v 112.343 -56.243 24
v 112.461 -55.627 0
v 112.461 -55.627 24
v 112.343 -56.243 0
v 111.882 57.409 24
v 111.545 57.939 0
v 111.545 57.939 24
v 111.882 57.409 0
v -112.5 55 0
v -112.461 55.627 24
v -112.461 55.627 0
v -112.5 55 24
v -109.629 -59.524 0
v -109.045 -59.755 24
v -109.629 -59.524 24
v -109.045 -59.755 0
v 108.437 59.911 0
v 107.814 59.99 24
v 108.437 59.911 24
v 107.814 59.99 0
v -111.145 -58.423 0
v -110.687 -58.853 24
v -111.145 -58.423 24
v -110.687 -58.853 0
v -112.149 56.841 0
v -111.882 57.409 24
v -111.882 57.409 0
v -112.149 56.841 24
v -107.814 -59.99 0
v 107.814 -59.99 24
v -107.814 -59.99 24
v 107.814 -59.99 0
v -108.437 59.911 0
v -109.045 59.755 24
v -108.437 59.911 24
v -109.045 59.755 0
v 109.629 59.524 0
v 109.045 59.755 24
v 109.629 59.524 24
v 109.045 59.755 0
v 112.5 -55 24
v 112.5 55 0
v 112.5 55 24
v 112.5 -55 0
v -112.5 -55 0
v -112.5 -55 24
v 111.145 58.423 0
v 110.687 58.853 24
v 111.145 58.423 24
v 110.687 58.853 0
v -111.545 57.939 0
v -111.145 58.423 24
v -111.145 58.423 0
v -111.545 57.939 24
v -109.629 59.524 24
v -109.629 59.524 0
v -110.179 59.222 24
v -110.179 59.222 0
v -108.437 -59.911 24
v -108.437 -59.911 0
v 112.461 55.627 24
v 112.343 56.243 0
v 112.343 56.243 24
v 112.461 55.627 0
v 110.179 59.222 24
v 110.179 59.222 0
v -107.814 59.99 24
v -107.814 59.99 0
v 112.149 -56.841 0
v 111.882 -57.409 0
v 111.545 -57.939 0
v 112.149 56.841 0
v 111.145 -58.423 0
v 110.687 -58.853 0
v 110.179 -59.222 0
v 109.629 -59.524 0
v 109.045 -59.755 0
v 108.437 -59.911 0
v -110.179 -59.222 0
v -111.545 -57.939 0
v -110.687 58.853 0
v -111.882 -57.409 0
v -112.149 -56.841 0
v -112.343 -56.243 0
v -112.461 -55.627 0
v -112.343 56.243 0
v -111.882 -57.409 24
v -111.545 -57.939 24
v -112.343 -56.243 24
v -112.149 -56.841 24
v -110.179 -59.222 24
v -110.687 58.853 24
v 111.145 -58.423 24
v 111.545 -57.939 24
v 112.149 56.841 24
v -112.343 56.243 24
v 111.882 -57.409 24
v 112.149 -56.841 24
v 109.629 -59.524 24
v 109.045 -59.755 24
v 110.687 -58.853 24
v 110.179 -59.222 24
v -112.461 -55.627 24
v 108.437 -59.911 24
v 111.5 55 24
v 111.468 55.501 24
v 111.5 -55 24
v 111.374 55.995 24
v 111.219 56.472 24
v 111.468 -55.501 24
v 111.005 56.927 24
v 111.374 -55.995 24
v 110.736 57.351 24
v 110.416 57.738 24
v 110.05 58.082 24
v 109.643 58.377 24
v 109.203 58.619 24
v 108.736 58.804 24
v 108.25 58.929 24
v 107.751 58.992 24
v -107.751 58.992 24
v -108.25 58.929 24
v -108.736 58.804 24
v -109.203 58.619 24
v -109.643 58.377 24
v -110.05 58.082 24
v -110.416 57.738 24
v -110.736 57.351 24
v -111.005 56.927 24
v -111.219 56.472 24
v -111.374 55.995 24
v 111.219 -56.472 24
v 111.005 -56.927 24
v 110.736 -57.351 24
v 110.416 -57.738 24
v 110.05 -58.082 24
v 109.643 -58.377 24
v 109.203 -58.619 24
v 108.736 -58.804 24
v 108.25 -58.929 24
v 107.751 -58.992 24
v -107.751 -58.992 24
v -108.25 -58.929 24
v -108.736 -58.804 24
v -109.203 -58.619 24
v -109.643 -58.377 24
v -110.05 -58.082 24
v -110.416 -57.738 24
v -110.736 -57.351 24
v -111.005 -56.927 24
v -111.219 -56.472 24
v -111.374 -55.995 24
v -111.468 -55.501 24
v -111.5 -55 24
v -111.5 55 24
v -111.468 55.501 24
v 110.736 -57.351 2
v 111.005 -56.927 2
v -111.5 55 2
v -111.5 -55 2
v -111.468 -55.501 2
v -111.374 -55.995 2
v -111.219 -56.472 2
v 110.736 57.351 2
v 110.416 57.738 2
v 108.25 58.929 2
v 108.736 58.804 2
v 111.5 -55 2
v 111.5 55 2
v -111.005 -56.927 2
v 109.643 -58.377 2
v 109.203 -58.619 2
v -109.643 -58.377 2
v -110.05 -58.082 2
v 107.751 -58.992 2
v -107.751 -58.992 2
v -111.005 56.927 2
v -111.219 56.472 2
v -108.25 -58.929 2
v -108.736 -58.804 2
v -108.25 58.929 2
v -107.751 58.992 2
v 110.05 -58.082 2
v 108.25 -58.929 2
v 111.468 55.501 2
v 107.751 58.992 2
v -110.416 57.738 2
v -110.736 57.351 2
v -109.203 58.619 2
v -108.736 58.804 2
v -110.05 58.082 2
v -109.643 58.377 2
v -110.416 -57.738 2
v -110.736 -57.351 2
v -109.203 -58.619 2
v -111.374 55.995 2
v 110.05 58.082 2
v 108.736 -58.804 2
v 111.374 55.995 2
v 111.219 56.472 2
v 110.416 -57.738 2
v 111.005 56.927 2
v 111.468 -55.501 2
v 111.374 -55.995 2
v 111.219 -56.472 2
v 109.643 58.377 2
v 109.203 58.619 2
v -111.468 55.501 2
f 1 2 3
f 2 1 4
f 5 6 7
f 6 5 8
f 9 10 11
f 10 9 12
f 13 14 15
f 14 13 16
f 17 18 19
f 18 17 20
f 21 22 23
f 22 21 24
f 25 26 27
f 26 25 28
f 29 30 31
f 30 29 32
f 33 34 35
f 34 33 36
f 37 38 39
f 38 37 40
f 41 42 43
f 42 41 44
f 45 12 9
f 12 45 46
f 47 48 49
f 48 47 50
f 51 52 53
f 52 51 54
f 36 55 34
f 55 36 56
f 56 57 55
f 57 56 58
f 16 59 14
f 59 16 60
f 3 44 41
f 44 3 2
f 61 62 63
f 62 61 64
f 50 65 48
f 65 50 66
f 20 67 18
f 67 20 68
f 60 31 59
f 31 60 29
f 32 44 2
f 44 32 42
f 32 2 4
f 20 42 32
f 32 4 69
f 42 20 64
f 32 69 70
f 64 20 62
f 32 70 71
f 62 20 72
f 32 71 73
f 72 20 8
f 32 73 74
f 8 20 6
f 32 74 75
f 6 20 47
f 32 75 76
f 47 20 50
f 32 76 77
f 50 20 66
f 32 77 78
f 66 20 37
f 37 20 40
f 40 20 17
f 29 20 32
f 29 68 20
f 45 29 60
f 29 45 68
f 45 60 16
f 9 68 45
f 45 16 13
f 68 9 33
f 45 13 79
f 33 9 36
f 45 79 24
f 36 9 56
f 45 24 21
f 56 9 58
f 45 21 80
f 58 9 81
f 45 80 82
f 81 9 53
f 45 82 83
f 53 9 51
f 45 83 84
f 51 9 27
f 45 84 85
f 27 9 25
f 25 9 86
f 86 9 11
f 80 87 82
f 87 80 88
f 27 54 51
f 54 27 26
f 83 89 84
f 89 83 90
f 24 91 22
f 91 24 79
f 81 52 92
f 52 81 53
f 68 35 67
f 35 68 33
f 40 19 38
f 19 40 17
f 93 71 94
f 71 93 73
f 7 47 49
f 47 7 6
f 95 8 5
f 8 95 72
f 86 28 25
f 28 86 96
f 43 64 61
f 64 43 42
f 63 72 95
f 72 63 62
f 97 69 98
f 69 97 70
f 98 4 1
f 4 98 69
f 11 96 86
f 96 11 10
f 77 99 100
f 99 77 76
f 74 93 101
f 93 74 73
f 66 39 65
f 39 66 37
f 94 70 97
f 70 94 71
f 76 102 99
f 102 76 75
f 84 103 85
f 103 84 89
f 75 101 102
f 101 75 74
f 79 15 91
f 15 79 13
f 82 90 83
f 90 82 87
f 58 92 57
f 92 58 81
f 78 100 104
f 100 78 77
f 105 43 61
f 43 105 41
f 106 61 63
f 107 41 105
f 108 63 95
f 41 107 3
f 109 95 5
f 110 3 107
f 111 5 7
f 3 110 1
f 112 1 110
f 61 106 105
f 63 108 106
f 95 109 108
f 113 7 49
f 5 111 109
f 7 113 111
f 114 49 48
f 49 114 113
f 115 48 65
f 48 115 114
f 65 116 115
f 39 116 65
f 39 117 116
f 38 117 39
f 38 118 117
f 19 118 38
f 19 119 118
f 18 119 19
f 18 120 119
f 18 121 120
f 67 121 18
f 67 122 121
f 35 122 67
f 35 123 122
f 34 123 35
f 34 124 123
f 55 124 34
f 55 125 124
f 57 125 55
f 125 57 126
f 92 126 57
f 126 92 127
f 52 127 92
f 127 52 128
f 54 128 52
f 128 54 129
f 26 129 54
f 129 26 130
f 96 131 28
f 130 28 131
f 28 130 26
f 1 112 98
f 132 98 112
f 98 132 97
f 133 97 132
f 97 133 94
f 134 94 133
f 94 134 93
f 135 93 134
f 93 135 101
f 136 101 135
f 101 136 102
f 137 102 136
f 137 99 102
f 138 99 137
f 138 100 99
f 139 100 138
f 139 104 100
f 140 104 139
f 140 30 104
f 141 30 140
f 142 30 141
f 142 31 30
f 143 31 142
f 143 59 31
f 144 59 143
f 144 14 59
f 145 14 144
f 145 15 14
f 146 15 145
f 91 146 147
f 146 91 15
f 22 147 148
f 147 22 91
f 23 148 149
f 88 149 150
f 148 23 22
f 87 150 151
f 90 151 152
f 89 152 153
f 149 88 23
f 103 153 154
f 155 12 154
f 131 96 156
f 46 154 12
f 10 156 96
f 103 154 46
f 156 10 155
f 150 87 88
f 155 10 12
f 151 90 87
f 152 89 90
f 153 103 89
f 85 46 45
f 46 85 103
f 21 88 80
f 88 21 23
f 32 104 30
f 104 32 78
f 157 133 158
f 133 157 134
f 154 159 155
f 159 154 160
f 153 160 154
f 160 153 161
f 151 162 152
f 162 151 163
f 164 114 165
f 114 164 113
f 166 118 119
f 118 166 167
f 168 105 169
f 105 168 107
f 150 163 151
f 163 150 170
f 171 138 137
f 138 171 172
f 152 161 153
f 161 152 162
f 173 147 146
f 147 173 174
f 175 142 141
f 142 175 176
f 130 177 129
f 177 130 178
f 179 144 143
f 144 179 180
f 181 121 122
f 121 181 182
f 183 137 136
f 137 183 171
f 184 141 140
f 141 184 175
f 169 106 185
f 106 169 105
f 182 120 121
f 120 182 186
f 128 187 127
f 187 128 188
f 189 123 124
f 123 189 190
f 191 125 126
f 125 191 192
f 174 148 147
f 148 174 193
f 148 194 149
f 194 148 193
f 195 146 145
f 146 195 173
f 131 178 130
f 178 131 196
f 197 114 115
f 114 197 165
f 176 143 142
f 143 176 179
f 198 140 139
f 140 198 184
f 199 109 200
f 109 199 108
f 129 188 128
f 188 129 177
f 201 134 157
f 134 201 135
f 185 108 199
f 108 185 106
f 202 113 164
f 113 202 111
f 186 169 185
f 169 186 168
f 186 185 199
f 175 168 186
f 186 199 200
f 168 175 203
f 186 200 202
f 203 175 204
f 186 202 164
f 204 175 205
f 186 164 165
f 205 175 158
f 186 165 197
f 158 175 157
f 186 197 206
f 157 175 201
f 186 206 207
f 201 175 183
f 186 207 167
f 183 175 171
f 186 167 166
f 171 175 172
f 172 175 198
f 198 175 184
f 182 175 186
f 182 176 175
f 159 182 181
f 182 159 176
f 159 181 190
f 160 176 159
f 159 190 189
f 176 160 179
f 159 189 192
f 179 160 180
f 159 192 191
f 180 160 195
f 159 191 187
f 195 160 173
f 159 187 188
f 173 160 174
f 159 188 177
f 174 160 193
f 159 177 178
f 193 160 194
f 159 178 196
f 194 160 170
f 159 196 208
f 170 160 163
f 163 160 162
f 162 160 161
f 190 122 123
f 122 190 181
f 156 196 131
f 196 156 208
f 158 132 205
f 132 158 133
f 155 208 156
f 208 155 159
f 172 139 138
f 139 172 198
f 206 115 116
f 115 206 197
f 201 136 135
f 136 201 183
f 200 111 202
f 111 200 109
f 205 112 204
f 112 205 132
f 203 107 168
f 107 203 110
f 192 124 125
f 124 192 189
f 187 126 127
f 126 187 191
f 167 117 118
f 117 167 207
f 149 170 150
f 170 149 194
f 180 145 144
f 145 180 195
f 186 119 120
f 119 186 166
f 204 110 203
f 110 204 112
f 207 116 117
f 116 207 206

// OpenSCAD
$fn = 50;


difference() {
	union() {
		hull() {
			translate(v = [-107.5000000000, 55.0000000000, 0]) {
				cylinder(h = 24, r = 5);
			}
			translate(v = [107.5000000000, 55.0000000000, 0]) {
				cylinder(h = 24, r = 5);
			}
			translate(v = [-107.5000000000, -55.0000000000, 0]) {
				cylinder(h = 24, r = 5);
			}
			translate(v = [107.5000000000, -55.0000000000, 0]) {
				cylinder(h = 24, r = 5);
			}
		}
	}
	union() {
		translate(v = [0, 0, 2]) {
			hull() {
				translate(v = [-107.5000000000, 55.0000000000, 0]) {
					cylinder(h = 22, r = 4);
				}
				translate(v = [107.5000000000, 55.0000000000, 0]) {
					cylinder(h = 22, r = 4);
				}
				translate(v = [-107.5000000000, -55.0000000000, 0]) {
					cylinder(h = 22, r = 4);
				}
				translate(v = [107.5000000000, -55.0000000000, 0]) {
					cylinder(h = 22, r = 4);
				}
			}
		}
	}
}
